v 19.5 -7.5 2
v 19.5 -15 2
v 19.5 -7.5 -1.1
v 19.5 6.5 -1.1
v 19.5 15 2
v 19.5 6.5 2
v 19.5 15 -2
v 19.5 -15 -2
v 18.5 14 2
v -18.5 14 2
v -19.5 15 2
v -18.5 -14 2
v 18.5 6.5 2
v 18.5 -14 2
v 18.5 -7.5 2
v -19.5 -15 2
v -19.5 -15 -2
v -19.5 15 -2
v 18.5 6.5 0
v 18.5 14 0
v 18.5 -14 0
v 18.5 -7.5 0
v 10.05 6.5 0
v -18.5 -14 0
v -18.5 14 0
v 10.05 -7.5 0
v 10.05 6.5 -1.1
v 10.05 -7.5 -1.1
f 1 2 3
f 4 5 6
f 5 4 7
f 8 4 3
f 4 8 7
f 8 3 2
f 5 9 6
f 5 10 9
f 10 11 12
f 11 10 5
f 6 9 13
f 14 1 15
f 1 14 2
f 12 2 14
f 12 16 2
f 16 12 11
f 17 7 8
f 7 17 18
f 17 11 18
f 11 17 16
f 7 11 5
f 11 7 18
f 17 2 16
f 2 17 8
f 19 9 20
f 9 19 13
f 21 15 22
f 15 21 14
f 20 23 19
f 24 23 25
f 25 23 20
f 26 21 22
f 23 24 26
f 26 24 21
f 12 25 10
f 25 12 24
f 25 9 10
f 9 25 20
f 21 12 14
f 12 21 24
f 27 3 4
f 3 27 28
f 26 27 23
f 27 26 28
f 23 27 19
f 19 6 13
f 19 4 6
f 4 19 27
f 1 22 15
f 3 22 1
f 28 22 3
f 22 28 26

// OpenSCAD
// largura = 440;
largura = 28;
// profundidade = 550;
profundidade = 37;
// altura = 440;
altura = 23;
// 13/2 = 6.5-0.1
parede = 2;

profDHT = 17.5;   // prof real: 15.5
largDHT = 14;   // larg real: 12

altUSB = 10;
largUSB = 14;
profUSB = 9.5;

// altura de Caixa teste
alturaBaseCaixa = 11;
locProfUSB = ((profundidade)/2)-3.7;
locLargUSB = -0.5;
// altura do USB para caixa original
locAltUSB = ((altUSB-altura)/2)-0.1;



module caixa(){
    difference(){
        cube([profundidade+parede, largura+parede, altura], center=true); //volume externo
        translate([0,0,parede]) cube([profundidade, largura, altura], center=true); // volume interno
        translate([locProfUSB, locLargUSB, locAltUSB]) cube([profUSB, largUSB, altUSB], center=true); // abertura usb
    }
}

module tampa(){
    difference(){
        cube([profundidade+parede, largura+parede, parede], center=true);
        translate([10.8,-0.5,0]) cube([profDHT, largDHT, 3], center=true);
        }
}

// altura do USB para caixa base com buraco
locBaseAltUSB = ((altUSB-alturaBaseCaixa)/2)-0.1;

module baseCaixa(){
    difference(){
        cube([profundidade+parede, largura+parede, alturaBaseCaixa], center=true); //volume externo
        translate([0,0,parede]) cube([profundidade, largura, alturaBaseCaixa], center=true); // volume interno
        translate([locProfUSB, locLargUSB, locBaseAltUSB]) cube([profUSB, largUSB, altUSB], center=true); // abertura usb
    }
}
// baseCaixa();
altBase = 4;
locBaseAltUSB2 = ((altUSB-altBase)/2)-0.1;
module base(){
    difference(){
        cube([profundidade+parede, largura+parede, altBase], center=true); //volume externo
        translate([0,0,parede]) cube([profundidade, largura, altBase], center=true); // volume interno
        translate([locProfUSB, locLargUSB, locBaseAltUSB2+1]) cube([profUSB, largUSB, altUSB], center=true); // abertura usb
    }
}
base();

// somente caixa
// caixa();
// somente tampa
// tampa();
// tampa e caixa
// translate([0,largura+3.5,-((altura/2)-1)]) tampa();
// caixa();
